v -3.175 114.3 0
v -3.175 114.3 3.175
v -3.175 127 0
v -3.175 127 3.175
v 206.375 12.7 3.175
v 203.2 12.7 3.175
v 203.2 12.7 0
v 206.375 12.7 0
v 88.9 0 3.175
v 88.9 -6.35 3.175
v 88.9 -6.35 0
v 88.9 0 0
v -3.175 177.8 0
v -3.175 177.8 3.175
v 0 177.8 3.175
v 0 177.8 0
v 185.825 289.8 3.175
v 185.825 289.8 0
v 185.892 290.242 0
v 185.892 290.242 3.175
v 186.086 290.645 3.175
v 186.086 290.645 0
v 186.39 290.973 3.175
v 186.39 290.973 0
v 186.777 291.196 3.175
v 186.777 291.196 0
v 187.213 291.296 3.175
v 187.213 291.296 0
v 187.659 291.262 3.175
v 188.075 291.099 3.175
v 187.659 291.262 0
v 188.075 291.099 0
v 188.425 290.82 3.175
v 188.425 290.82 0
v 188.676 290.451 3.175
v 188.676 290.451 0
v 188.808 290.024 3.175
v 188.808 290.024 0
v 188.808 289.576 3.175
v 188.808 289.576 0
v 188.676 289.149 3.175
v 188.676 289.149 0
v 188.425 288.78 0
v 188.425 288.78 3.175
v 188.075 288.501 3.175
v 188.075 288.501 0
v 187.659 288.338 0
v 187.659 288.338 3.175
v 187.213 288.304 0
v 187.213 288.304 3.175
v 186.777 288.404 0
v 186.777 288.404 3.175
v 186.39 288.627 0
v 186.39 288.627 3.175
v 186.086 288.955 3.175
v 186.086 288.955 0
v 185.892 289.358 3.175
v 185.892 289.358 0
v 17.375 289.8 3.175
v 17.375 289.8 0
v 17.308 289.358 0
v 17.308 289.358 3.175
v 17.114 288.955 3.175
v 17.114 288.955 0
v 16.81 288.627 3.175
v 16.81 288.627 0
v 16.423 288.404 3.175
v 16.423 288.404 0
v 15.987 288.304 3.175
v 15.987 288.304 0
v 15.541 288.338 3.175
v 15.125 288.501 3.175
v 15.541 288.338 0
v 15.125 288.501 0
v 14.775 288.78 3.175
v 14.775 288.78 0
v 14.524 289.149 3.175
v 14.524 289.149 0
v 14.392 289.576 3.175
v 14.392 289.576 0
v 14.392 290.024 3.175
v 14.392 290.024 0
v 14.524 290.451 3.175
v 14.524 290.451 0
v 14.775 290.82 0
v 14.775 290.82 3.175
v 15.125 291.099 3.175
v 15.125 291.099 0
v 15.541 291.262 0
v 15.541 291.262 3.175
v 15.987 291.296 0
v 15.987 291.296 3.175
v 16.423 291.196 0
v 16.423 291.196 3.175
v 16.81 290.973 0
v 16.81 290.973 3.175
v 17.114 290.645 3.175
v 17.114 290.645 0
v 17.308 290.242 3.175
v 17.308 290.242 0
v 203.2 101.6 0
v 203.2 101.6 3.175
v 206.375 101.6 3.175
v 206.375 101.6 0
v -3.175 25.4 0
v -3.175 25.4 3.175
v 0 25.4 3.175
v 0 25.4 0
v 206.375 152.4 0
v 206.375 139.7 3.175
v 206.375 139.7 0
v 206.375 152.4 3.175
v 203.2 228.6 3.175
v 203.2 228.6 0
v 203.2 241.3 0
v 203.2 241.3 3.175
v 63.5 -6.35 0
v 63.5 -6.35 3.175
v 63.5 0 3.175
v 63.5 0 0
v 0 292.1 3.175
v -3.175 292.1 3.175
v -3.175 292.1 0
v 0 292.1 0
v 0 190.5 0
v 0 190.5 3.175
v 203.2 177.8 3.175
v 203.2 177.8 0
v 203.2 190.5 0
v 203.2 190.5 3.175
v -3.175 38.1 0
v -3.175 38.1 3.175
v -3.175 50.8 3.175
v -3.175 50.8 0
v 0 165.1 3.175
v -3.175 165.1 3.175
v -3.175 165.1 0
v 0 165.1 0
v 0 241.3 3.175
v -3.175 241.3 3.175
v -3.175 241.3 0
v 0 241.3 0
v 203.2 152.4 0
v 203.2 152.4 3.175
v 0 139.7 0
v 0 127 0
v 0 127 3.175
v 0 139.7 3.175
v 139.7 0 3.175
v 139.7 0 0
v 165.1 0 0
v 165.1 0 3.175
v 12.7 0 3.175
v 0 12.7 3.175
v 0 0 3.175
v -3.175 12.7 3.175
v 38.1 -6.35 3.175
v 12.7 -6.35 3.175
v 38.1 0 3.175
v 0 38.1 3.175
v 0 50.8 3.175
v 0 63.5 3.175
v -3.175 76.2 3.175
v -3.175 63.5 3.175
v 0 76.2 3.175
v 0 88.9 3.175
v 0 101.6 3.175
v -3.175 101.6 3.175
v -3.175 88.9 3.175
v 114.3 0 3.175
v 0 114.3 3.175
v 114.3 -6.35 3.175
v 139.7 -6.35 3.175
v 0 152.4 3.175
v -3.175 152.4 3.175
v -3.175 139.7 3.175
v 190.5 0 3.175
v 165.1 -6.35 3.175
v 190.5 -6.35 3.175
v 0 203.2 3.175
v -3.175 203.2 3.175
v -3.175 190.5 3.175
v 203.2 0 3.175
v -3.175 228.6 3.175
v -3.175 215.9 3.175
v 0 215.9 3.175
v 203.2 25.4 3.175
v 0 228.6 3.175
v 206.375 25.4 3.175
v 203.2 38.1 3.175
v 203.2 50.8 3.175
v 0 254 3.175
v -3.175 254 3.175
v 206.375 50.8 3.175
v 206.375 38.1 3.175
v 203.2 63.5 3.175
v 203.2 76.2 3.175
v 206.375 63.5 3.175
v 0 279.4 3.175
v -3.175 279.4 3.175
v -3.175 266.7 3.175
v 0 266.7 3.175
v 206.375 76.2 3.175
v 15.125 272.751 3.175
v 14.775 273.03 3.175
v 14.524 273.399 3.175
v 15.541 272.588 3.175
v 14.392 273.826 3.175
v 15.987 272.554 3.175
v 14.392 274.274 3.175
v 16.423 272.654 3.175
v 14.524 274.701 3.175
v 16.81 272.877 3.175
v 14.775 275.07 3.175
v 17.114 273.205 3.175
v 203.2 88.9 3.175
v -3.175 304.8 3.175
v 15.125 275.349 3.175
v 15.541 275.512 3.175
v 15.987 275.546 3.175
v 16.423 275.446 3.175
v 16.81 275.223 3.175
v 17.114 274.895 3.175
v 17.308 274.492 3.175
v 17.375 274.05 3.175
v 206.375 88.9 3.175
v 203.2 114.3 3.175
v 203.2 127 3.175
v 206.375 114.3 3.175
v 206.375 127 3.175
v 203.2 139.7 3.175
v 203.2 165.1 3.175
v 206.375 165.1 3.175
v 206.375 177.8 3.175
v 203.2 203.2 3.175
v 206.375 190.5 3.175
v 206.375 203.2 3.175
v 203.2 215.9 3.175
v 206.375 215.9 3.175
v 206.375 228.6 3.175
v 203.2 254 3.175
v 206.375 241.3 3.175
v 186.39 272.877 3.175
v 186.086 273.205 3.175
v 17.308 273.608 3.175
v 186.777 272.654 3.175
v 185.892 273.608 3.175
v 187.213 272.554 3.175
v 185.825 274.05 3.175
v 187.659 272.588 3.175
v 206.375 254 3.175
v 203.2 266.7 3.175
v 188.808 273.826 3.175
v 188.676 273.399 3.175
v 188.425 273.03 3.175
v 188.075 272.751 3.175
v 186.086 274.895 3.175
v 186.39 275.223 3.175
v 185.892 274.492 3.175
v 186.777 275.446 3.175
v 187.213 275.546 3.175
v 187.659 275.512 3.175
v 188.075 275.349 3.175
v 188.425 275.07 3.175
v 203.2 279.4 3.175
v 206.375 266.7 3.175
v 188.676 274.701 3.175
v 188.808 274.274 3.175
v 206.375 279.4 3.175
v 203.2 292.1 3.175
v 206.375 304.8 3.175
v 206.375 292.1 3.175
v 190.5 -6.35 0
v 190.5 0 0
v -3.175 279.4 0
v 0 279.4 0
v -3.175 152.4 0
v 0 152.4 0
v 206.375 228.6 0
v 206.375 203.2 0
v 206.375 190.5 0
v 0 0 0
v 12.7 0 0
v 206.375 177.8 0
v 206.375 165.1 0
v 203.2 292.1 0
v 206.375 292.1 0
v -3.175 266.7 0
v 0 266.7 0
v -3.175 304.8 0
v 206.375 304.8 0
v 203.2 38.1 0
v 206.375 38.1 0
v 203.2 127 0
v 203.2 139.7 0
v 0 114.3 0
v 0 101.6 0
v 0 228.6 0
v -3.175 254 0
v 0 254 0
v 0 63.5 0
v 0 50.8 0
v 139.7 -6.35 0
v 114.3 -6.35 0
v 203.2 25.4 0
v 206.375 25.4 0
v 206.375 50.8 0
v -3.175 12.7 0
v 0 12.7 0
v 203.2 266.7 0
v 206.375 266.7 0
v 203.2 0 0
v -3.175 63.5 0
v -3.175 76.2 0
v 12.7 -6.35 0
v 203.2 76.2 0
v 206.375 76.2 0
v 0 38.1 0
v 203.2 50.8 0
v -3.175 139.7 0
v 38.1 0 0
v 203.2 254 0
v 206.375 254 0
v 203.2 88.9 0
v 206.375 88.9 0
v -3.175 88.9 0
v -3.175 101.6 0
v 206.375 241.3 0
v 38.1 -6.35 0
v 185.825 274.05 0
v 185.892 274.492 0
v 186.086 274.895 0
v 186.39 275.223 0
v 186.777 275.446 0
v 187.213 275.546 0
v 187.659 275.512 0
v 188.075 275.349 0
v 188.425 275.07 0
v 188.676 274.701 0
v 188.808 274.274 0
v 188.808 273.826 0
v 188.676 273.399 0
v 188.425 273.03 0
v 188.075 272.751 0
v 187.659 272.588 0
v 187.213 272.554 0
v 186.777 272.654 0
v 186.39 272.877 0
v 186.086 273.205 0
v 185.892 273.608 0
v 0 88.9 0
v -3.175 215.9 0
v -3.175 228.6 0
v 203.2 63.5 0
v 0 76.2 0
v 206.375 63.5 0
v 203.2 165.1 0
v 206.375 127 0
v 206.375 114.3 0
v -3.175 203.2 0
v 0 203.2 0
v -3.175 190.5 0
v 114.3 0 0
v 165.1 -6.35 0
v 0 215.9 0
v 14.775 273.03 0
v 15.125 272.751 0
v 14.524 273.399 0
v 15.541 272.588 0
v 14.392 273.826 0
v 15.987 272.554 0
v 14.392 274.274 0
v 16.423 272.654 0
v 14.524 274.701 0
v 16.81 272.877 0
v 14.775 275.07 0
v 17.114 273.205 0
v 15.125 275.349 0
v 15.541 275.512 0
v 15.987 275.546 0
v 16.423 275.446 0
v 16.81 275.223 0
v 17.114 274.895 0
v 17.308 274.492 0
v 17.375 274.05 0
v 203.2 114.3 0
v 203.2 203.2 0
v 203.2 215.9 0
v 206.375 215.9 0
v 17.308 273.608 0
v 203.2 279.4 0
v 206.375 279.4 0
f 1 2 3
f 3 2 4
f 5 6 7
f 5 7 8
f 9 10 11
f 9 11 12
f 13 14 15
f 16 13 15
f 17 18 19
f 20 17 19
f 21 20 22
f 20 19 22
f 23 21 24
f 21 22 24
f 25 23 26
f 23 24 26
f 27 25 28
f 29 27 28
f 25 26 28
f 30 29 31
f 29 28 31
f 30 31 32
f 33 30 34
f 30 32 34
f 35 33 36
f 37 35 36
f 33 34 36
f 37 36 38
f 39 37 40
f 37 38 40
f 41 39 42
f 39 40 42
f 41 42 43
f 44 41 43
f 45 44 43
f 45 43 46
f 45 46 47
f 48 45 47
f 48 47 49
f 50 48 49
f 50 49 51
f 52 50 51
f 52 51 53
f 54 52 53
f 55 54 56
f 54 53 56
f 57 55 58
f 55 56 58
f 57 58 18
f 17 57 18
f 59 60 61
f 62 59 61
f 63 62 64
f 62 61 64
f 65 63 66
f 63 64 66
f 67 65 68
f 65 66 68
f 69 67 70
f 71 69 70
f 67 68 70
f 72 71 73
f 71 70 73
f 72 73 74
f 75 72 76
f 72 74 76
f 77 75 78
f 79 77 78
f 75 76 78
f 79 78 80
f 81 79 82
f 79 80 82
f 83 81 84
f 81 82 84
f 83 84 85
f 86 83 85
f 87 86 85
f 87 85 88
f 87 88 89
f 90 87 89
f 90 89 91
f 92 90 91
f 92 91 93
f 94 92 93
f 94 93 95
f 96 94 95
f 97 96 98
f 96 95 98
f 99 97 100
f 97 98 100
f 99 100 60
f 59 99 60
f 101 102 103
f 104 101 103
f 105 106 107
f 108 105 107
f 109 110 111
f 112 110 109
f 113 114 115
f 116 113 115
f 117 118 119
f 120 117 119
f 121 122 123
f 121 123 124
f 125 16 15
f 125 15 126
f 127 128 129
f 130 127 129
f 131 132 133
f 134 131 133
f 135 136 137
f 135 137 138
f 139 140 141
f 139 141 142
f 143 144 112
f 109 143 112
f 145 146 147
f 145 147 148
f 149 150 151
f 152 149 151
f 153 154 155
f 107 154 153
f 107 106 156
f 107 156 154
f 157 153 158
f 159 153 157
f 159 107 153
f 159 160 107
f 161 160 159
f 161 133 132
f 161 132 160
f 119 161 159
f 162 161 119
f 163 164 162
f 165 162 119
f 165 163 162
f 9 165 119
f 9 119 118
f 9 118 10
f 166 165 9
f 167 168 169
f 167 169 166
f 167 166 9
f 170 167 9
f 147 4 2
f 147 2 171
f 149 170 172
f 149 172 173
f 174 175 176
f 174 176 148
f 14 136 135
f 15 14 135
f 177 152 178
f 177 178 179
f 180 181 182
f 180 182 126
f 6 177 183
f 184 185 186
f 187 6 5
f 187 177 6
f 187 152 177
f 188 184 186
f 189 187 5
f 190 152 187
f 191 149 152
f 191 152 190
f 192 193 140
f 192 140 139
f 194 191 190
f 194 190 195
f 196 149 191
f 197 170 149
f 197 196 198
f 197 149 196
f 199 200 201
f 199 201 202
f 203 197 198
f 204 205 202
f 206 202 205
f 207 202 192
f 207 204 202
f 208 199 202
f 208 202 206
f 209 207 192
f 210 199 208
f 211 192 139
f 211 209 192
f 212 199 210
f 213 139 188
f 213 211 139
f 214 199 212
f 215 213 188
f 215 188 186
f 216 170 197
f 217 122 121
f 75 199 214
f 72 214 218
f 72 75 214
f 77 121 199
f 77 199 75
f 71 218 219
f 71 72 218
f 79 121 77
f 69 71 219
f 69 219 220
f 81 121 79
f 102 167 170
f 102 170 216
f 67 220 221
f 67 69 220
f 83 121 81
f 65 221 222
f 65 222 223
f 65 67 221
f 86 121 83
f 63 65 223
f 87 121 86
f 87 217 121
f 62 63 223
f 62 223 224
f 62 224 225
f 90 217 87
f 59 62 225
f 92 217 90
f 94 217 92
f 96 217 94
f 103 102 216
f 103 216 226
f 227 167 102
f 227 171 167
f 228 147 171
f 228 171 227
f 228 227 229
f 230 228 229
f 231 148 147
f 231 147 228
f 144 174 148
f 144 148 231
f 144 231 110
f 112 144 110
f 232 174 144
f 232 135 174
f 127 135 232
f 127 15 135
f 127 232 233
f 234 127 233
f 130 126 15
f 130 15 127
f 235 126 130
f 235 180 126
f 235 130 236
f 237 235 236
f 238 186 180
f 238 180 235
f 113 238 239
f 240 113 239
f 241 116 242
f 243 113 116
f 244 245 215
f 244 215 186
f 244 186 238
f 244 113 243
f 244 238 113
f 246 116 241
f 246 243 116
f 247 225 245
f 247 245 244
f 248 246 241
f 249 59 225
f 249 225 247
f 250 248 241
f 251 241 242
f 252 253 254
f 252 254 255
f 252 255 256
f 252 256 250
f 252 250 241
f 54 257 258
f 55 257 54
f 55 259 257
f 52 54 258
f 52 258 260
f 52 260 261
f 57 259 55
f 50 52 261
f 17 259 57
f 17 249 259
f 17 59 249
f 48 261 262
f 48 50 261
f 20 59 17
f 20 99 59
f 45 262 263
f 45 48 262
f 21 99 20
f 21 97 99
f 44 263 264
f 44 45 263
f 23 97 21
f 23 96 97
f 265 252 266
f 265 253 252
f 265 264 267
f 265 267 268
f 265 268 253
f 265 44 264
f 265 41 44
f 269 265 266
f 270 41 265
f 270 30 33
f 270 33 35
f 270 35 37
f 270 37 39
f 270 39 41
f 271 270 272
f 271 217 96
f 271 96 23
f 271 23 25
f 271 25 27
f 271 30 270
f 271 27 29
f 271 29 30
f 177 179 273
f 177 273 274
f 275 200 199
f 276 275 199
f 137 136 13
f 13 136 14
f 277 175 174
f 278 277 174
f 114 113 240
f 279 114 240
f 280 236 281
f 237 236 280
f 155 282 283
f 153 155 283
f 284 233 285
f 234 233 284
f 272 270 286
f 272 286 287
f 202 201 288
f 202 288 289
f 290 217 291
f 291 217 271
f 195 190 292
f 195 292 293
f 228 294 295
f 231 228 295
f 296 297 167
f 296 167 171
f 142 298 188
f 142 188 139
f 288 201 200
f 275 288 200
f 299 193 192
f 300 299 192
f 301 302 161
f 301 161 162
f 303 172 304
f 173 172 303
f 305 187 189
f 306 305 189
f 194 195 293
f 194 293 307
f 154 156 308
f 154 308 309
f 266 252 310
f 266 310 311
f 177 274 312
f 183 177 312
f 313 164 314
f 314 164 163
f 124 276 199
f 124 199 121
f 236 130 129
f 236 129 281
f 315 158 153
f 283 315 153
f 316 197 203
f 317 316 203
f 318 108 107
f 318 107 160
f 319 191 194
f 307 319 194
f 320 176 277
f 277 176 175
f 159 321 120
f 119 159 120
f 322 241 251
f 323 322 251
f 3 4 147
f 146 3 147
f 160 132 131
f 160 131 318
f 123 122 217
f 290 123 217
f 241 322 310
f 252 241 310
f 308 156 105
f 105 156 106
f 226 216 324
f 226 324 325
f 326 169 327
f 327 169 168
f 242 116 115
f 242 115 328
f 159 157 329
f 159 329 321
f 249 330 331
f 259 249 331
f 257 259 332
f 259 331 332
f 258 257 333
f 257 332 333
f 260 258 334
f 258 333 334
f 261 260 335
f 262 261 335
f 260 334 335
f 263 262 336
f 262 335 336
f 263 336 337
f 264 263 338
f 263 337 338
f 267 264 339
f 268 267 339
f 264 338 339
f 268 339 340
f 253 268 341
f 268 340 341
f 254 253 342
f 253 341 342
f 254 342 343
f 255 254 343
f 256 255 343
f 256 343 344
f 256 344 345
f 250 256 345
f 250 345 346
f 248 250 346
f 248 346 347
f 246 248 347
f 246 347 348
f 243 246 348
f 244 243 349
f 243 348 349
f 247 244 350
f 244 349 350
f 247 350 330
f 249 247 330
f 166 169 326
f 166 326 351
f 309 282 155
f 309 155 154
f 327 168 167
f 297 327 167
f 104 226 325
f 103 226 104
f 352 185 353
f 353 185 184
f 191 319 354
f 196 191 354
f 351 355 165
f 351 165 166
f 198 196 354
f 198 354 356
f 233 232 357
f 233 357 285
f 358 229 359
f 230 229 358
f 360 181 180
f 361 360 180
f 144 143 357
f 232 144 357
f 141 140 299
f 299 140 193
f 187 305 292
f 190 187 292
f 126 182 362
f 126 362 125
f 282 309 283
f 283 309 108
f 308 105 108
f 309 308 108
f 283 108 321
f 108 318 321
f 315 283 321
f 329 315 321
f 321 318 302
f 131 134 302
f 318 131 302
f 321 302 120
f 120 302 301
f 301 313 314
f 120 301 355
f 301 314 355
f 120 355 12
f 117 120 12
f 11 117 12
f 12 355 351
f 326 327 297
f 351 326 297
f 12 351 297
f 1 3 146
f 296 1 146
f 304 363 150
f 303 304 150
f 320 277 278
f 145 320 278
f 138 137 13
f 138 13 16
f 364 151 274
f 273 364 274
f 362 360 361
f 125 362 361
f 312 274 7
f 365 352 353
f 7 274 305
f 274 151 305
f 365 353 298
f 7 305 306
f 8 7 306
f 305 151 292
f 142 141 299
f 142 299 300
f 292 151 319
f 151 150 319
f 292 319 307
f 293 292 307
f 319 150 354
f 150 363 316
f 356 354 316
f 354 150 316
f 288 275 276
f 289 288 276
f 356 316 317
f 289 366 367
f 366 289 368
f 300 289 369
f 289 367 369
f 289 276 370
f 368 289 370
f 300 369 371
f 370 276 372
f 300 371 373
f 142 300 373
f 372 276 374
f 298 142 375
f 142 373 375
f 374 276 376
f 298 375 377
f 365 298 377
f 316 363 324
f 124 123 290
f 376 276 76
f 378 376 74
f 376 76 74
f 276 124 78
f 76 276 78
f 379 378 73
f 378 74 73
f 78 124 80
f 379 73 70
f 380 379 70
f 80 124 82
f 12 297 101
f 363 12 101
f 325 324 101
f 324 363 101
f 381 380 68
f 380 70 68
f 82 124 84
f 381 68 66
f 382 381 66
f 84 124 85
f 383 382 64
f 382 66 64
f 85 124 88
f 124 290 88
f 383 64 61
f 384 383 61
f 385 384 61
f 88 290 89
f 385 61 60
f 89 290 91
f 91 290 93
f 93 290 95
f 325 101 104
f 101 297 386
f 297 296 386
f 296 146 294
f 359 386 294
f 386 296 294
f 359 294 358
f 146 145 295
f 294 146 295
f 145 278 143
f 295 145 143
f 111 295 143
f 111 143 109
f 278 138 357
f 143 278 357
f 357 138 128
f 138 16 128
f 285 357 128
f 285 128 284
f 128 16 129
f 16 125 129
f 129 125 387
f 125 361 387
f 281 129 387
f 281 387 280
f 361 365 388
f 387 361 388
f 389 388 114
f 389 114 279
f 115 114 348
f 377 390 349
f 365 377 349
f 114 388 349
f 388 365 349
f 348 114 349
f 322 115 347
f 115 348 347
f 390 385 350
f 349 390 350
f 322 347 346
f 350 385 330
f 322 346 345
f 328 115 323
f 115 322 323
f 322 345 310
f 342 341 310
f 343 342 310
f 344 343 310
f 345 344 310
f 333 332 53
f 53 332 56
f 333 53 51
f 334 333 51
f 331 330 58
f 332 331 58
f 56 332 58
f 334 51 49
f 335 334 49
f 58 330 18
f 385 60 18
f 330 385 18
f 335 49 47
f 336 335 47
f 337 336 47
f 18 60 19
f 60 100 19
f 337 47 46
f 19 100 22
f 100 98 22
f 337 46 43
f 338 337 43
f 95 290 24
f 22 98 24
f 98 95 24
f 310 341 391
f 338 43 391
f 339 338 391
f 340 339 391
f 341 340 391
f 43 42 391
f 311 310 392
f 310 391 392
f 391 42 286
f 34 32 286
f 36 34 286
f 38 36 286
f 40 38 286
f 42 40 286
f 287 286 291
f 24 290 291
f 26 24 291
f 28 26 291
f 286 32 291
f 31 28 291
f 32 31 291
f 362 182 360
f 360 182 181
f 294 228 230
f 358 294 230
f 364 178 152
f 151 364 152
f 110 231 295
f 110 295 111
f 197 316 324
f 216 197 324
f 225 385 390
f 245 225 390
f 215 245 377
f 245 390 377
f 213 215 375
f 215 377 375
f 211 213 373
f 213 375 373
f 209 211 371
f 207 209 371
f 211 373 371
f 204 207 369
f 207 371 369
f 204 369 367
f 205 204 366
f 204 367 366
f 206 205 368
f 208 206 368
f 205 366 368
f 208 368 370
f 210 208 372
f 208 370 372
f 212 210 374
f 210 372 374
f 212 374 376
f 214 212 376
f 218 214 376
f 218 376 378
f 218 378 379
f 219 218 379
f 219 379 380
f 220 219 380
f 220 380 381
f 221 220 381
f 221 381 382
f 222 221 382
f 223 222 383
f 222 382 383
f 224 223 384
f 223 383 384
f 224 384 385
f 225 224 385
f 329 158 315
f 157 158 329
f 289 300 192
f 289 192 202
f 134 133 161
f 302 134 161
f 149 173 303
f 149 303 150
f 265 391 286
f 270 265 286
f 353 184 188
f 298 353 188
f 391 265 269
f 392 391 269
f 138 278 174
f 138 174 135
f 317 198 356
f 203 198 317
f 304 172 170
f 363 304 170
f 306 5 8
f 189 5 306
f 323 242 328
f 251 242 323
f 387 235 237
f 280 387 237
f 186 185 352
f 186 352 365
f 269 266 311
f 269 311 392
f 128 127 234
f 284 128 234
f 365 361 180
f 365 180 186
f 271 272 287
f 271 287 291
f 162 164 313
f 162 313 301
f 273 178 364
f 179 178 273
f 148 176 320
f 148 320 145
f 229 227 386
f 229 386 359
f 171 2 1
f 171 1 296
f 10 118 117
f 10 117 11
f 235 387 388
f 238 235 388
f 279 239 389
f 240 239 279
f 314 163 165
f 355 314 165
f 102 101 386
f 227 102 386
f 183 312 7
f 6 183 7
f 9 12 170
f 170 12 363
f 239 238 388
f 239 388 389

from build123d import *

# Parameters (mm, degrees)
SKETCH1_W           = 203.2
SKETCH1_H           = 304.8
BOSS_EXTRUDE1_DEPTH = 3.175
SKETCH2_W           = 3.175
SKETCH2_H           = 12.7
SKETCH2_W_2         = 25.4
SKETCH2_H_2         = 6.35
BOSS_EXTRUDE2_DEPTH = 3.175
SKETCH5_R           = 1.5
CUT_EXTRUDE2_DEPTH  = 3.175


with BuildPart() as part:
    # Sketch1 → Boss-Extrude1 (new body)
    with BuildSketch(Plane.XY):
        with Locations((101.6, 152.4)):
            Rectangle(SKETCH1_W, SKETCH1_H)
    extrude(amount=BOSS_EXTRUDE1_DEPTH)

    # Sketch2 → Boss-Extrude2 (add)
    with BuildSketch(Plane.XY.offset(3.175)):
        with Locations((-1.5875, 298.45)):
            Rectangle(SKETCH2_W, SKETCH2_H)
        with Locations((204.7875, 298.45)):
            Rectangle(SKETCH2_W, SKETCH2_H)
        with Locations((-1.5875, 273.05)):
            Rectangle(SKETCH2_W, SKETCH2_H)
        with Locations((204.7875, 273.05)):
            Rectangle(SKETCH2_W, SKETCH2_H)
        with Locations((-1.5875, 247.65)):
            Rectangle(SKETCH2_W, SKETCH2_H)
        with Locations((204.7875, 247.65)):
            Rectangle(SKETCH2_W, SKETCH2_H)
        with Locations((-1.5875, 222.25)):
            Rectangle(SKETCH2_W, SKETCH2_H)
        with Locations((204.7875, 222.25)):
            Rectangle(SKETCH2_W, SKETCH2_H)
        with Locations((-1.5875, 196.85)):
            Rectangle(SKETCH2_W, SKETCH2_H)
        with Locations((204.7875, 196.85)):
            Rectangle(SKETCH2_W, SKETCH2_H)
        with Locations((-1.5875, 171.45)):
            Rectangle(SKETCH2_W, SKETCH2_H)
        with Locations((204.7875, 171.45)):
            Rectangle(SKETCH2_W, SKETCH2_H)
        with Locations((-1.5875, 146.05)):
            Rectangle(SKETCH2_W, SKETCH2_H)
        with Locations((204.7875, 146.05)):
            Rectangle(SKETCH2_W, SKETCH2_H)
        with Locations((-1.5875, 120.65)):
            Rectangle(SKETCH2_W, SKETCH2_H)
        with Locations((204.7875, 120.65)):
            Rectangle(SKETCH2_W, SKETCH2_H)
        with Locations((-1.5875, 95.25)):
            Rectangle(SKETCH2_W, SKETCH2_H)
        with Locations((204.7875, 95.25)):
            Rectangle(SKETCH2_W, SKETCH2_H)
        with Locations((-1.5875, 69.85)):
            Rectangle(SKETCH2_W, SKETCH2_H)
        with Locations((204.7875, 69.85)):
            Rectangle(SKETCH2_W, SKETCH2_H)
        with Locations((-1.5875, 44.45)):
            Rectangle(SKETCH2_W, SKETCH2_H)
        with Locations((204.7875, 44.45)):
            Rectangle(SKETCH2_W, SKETCH2_H)
        with Locations((-1.5875, 19.05)):
            Rectangle(SKETCH2_W, SKETCH2_H)
        with Locations((204.7875, 19.05)):
            Rectangle(SKETCH2_W, SKETCH2_H)
        with Locations((25.4, -3.175)):
            Rectangle(SKETCH2_W_2, SKETCH2_H_2)
        with Locations((76.2, -3.175)):
            Rectangle(SKETCH2_W_2, SKETCH2_H_2)
        with Locations((127, -3.175)):
            Rectangle(SKETCH2_W_2, SKETCH2_H_2)
        with Locations((177.8, -3.175)):
            Rectangle(SKETCH2_W_2, SKETCH2_H_2)
    extrude(amount=-BOSS_EXTRUDE2_DEPTH)

    # Sketch5 → Cut-Extrude2 (cut)
    with BuildSketch(Plane(origin=(0, 0, 0), x_dir=(-1, 0, 0), z_dir=(0, 0, -1))):
        with Locations((-187.325, 289.8)):
            Circle(SKETCH5_R)
        with Locations((-187.325, 274.05)):
            Circle(SKETCH5_R)
        with Locations(Location((-15.875, 274.05, 0), (0, 0, 180))):
            Circle(SKETCH5_R)
        with Locations(Location((-15.875, 289.8, 0), (0, 0, 180))):
            Circle(SKETCH5_R)
    extrude(amount=-CUT_EXTRUDE2_DEPTH, mode=Mode.SUBTRACT)


solid = part.part
